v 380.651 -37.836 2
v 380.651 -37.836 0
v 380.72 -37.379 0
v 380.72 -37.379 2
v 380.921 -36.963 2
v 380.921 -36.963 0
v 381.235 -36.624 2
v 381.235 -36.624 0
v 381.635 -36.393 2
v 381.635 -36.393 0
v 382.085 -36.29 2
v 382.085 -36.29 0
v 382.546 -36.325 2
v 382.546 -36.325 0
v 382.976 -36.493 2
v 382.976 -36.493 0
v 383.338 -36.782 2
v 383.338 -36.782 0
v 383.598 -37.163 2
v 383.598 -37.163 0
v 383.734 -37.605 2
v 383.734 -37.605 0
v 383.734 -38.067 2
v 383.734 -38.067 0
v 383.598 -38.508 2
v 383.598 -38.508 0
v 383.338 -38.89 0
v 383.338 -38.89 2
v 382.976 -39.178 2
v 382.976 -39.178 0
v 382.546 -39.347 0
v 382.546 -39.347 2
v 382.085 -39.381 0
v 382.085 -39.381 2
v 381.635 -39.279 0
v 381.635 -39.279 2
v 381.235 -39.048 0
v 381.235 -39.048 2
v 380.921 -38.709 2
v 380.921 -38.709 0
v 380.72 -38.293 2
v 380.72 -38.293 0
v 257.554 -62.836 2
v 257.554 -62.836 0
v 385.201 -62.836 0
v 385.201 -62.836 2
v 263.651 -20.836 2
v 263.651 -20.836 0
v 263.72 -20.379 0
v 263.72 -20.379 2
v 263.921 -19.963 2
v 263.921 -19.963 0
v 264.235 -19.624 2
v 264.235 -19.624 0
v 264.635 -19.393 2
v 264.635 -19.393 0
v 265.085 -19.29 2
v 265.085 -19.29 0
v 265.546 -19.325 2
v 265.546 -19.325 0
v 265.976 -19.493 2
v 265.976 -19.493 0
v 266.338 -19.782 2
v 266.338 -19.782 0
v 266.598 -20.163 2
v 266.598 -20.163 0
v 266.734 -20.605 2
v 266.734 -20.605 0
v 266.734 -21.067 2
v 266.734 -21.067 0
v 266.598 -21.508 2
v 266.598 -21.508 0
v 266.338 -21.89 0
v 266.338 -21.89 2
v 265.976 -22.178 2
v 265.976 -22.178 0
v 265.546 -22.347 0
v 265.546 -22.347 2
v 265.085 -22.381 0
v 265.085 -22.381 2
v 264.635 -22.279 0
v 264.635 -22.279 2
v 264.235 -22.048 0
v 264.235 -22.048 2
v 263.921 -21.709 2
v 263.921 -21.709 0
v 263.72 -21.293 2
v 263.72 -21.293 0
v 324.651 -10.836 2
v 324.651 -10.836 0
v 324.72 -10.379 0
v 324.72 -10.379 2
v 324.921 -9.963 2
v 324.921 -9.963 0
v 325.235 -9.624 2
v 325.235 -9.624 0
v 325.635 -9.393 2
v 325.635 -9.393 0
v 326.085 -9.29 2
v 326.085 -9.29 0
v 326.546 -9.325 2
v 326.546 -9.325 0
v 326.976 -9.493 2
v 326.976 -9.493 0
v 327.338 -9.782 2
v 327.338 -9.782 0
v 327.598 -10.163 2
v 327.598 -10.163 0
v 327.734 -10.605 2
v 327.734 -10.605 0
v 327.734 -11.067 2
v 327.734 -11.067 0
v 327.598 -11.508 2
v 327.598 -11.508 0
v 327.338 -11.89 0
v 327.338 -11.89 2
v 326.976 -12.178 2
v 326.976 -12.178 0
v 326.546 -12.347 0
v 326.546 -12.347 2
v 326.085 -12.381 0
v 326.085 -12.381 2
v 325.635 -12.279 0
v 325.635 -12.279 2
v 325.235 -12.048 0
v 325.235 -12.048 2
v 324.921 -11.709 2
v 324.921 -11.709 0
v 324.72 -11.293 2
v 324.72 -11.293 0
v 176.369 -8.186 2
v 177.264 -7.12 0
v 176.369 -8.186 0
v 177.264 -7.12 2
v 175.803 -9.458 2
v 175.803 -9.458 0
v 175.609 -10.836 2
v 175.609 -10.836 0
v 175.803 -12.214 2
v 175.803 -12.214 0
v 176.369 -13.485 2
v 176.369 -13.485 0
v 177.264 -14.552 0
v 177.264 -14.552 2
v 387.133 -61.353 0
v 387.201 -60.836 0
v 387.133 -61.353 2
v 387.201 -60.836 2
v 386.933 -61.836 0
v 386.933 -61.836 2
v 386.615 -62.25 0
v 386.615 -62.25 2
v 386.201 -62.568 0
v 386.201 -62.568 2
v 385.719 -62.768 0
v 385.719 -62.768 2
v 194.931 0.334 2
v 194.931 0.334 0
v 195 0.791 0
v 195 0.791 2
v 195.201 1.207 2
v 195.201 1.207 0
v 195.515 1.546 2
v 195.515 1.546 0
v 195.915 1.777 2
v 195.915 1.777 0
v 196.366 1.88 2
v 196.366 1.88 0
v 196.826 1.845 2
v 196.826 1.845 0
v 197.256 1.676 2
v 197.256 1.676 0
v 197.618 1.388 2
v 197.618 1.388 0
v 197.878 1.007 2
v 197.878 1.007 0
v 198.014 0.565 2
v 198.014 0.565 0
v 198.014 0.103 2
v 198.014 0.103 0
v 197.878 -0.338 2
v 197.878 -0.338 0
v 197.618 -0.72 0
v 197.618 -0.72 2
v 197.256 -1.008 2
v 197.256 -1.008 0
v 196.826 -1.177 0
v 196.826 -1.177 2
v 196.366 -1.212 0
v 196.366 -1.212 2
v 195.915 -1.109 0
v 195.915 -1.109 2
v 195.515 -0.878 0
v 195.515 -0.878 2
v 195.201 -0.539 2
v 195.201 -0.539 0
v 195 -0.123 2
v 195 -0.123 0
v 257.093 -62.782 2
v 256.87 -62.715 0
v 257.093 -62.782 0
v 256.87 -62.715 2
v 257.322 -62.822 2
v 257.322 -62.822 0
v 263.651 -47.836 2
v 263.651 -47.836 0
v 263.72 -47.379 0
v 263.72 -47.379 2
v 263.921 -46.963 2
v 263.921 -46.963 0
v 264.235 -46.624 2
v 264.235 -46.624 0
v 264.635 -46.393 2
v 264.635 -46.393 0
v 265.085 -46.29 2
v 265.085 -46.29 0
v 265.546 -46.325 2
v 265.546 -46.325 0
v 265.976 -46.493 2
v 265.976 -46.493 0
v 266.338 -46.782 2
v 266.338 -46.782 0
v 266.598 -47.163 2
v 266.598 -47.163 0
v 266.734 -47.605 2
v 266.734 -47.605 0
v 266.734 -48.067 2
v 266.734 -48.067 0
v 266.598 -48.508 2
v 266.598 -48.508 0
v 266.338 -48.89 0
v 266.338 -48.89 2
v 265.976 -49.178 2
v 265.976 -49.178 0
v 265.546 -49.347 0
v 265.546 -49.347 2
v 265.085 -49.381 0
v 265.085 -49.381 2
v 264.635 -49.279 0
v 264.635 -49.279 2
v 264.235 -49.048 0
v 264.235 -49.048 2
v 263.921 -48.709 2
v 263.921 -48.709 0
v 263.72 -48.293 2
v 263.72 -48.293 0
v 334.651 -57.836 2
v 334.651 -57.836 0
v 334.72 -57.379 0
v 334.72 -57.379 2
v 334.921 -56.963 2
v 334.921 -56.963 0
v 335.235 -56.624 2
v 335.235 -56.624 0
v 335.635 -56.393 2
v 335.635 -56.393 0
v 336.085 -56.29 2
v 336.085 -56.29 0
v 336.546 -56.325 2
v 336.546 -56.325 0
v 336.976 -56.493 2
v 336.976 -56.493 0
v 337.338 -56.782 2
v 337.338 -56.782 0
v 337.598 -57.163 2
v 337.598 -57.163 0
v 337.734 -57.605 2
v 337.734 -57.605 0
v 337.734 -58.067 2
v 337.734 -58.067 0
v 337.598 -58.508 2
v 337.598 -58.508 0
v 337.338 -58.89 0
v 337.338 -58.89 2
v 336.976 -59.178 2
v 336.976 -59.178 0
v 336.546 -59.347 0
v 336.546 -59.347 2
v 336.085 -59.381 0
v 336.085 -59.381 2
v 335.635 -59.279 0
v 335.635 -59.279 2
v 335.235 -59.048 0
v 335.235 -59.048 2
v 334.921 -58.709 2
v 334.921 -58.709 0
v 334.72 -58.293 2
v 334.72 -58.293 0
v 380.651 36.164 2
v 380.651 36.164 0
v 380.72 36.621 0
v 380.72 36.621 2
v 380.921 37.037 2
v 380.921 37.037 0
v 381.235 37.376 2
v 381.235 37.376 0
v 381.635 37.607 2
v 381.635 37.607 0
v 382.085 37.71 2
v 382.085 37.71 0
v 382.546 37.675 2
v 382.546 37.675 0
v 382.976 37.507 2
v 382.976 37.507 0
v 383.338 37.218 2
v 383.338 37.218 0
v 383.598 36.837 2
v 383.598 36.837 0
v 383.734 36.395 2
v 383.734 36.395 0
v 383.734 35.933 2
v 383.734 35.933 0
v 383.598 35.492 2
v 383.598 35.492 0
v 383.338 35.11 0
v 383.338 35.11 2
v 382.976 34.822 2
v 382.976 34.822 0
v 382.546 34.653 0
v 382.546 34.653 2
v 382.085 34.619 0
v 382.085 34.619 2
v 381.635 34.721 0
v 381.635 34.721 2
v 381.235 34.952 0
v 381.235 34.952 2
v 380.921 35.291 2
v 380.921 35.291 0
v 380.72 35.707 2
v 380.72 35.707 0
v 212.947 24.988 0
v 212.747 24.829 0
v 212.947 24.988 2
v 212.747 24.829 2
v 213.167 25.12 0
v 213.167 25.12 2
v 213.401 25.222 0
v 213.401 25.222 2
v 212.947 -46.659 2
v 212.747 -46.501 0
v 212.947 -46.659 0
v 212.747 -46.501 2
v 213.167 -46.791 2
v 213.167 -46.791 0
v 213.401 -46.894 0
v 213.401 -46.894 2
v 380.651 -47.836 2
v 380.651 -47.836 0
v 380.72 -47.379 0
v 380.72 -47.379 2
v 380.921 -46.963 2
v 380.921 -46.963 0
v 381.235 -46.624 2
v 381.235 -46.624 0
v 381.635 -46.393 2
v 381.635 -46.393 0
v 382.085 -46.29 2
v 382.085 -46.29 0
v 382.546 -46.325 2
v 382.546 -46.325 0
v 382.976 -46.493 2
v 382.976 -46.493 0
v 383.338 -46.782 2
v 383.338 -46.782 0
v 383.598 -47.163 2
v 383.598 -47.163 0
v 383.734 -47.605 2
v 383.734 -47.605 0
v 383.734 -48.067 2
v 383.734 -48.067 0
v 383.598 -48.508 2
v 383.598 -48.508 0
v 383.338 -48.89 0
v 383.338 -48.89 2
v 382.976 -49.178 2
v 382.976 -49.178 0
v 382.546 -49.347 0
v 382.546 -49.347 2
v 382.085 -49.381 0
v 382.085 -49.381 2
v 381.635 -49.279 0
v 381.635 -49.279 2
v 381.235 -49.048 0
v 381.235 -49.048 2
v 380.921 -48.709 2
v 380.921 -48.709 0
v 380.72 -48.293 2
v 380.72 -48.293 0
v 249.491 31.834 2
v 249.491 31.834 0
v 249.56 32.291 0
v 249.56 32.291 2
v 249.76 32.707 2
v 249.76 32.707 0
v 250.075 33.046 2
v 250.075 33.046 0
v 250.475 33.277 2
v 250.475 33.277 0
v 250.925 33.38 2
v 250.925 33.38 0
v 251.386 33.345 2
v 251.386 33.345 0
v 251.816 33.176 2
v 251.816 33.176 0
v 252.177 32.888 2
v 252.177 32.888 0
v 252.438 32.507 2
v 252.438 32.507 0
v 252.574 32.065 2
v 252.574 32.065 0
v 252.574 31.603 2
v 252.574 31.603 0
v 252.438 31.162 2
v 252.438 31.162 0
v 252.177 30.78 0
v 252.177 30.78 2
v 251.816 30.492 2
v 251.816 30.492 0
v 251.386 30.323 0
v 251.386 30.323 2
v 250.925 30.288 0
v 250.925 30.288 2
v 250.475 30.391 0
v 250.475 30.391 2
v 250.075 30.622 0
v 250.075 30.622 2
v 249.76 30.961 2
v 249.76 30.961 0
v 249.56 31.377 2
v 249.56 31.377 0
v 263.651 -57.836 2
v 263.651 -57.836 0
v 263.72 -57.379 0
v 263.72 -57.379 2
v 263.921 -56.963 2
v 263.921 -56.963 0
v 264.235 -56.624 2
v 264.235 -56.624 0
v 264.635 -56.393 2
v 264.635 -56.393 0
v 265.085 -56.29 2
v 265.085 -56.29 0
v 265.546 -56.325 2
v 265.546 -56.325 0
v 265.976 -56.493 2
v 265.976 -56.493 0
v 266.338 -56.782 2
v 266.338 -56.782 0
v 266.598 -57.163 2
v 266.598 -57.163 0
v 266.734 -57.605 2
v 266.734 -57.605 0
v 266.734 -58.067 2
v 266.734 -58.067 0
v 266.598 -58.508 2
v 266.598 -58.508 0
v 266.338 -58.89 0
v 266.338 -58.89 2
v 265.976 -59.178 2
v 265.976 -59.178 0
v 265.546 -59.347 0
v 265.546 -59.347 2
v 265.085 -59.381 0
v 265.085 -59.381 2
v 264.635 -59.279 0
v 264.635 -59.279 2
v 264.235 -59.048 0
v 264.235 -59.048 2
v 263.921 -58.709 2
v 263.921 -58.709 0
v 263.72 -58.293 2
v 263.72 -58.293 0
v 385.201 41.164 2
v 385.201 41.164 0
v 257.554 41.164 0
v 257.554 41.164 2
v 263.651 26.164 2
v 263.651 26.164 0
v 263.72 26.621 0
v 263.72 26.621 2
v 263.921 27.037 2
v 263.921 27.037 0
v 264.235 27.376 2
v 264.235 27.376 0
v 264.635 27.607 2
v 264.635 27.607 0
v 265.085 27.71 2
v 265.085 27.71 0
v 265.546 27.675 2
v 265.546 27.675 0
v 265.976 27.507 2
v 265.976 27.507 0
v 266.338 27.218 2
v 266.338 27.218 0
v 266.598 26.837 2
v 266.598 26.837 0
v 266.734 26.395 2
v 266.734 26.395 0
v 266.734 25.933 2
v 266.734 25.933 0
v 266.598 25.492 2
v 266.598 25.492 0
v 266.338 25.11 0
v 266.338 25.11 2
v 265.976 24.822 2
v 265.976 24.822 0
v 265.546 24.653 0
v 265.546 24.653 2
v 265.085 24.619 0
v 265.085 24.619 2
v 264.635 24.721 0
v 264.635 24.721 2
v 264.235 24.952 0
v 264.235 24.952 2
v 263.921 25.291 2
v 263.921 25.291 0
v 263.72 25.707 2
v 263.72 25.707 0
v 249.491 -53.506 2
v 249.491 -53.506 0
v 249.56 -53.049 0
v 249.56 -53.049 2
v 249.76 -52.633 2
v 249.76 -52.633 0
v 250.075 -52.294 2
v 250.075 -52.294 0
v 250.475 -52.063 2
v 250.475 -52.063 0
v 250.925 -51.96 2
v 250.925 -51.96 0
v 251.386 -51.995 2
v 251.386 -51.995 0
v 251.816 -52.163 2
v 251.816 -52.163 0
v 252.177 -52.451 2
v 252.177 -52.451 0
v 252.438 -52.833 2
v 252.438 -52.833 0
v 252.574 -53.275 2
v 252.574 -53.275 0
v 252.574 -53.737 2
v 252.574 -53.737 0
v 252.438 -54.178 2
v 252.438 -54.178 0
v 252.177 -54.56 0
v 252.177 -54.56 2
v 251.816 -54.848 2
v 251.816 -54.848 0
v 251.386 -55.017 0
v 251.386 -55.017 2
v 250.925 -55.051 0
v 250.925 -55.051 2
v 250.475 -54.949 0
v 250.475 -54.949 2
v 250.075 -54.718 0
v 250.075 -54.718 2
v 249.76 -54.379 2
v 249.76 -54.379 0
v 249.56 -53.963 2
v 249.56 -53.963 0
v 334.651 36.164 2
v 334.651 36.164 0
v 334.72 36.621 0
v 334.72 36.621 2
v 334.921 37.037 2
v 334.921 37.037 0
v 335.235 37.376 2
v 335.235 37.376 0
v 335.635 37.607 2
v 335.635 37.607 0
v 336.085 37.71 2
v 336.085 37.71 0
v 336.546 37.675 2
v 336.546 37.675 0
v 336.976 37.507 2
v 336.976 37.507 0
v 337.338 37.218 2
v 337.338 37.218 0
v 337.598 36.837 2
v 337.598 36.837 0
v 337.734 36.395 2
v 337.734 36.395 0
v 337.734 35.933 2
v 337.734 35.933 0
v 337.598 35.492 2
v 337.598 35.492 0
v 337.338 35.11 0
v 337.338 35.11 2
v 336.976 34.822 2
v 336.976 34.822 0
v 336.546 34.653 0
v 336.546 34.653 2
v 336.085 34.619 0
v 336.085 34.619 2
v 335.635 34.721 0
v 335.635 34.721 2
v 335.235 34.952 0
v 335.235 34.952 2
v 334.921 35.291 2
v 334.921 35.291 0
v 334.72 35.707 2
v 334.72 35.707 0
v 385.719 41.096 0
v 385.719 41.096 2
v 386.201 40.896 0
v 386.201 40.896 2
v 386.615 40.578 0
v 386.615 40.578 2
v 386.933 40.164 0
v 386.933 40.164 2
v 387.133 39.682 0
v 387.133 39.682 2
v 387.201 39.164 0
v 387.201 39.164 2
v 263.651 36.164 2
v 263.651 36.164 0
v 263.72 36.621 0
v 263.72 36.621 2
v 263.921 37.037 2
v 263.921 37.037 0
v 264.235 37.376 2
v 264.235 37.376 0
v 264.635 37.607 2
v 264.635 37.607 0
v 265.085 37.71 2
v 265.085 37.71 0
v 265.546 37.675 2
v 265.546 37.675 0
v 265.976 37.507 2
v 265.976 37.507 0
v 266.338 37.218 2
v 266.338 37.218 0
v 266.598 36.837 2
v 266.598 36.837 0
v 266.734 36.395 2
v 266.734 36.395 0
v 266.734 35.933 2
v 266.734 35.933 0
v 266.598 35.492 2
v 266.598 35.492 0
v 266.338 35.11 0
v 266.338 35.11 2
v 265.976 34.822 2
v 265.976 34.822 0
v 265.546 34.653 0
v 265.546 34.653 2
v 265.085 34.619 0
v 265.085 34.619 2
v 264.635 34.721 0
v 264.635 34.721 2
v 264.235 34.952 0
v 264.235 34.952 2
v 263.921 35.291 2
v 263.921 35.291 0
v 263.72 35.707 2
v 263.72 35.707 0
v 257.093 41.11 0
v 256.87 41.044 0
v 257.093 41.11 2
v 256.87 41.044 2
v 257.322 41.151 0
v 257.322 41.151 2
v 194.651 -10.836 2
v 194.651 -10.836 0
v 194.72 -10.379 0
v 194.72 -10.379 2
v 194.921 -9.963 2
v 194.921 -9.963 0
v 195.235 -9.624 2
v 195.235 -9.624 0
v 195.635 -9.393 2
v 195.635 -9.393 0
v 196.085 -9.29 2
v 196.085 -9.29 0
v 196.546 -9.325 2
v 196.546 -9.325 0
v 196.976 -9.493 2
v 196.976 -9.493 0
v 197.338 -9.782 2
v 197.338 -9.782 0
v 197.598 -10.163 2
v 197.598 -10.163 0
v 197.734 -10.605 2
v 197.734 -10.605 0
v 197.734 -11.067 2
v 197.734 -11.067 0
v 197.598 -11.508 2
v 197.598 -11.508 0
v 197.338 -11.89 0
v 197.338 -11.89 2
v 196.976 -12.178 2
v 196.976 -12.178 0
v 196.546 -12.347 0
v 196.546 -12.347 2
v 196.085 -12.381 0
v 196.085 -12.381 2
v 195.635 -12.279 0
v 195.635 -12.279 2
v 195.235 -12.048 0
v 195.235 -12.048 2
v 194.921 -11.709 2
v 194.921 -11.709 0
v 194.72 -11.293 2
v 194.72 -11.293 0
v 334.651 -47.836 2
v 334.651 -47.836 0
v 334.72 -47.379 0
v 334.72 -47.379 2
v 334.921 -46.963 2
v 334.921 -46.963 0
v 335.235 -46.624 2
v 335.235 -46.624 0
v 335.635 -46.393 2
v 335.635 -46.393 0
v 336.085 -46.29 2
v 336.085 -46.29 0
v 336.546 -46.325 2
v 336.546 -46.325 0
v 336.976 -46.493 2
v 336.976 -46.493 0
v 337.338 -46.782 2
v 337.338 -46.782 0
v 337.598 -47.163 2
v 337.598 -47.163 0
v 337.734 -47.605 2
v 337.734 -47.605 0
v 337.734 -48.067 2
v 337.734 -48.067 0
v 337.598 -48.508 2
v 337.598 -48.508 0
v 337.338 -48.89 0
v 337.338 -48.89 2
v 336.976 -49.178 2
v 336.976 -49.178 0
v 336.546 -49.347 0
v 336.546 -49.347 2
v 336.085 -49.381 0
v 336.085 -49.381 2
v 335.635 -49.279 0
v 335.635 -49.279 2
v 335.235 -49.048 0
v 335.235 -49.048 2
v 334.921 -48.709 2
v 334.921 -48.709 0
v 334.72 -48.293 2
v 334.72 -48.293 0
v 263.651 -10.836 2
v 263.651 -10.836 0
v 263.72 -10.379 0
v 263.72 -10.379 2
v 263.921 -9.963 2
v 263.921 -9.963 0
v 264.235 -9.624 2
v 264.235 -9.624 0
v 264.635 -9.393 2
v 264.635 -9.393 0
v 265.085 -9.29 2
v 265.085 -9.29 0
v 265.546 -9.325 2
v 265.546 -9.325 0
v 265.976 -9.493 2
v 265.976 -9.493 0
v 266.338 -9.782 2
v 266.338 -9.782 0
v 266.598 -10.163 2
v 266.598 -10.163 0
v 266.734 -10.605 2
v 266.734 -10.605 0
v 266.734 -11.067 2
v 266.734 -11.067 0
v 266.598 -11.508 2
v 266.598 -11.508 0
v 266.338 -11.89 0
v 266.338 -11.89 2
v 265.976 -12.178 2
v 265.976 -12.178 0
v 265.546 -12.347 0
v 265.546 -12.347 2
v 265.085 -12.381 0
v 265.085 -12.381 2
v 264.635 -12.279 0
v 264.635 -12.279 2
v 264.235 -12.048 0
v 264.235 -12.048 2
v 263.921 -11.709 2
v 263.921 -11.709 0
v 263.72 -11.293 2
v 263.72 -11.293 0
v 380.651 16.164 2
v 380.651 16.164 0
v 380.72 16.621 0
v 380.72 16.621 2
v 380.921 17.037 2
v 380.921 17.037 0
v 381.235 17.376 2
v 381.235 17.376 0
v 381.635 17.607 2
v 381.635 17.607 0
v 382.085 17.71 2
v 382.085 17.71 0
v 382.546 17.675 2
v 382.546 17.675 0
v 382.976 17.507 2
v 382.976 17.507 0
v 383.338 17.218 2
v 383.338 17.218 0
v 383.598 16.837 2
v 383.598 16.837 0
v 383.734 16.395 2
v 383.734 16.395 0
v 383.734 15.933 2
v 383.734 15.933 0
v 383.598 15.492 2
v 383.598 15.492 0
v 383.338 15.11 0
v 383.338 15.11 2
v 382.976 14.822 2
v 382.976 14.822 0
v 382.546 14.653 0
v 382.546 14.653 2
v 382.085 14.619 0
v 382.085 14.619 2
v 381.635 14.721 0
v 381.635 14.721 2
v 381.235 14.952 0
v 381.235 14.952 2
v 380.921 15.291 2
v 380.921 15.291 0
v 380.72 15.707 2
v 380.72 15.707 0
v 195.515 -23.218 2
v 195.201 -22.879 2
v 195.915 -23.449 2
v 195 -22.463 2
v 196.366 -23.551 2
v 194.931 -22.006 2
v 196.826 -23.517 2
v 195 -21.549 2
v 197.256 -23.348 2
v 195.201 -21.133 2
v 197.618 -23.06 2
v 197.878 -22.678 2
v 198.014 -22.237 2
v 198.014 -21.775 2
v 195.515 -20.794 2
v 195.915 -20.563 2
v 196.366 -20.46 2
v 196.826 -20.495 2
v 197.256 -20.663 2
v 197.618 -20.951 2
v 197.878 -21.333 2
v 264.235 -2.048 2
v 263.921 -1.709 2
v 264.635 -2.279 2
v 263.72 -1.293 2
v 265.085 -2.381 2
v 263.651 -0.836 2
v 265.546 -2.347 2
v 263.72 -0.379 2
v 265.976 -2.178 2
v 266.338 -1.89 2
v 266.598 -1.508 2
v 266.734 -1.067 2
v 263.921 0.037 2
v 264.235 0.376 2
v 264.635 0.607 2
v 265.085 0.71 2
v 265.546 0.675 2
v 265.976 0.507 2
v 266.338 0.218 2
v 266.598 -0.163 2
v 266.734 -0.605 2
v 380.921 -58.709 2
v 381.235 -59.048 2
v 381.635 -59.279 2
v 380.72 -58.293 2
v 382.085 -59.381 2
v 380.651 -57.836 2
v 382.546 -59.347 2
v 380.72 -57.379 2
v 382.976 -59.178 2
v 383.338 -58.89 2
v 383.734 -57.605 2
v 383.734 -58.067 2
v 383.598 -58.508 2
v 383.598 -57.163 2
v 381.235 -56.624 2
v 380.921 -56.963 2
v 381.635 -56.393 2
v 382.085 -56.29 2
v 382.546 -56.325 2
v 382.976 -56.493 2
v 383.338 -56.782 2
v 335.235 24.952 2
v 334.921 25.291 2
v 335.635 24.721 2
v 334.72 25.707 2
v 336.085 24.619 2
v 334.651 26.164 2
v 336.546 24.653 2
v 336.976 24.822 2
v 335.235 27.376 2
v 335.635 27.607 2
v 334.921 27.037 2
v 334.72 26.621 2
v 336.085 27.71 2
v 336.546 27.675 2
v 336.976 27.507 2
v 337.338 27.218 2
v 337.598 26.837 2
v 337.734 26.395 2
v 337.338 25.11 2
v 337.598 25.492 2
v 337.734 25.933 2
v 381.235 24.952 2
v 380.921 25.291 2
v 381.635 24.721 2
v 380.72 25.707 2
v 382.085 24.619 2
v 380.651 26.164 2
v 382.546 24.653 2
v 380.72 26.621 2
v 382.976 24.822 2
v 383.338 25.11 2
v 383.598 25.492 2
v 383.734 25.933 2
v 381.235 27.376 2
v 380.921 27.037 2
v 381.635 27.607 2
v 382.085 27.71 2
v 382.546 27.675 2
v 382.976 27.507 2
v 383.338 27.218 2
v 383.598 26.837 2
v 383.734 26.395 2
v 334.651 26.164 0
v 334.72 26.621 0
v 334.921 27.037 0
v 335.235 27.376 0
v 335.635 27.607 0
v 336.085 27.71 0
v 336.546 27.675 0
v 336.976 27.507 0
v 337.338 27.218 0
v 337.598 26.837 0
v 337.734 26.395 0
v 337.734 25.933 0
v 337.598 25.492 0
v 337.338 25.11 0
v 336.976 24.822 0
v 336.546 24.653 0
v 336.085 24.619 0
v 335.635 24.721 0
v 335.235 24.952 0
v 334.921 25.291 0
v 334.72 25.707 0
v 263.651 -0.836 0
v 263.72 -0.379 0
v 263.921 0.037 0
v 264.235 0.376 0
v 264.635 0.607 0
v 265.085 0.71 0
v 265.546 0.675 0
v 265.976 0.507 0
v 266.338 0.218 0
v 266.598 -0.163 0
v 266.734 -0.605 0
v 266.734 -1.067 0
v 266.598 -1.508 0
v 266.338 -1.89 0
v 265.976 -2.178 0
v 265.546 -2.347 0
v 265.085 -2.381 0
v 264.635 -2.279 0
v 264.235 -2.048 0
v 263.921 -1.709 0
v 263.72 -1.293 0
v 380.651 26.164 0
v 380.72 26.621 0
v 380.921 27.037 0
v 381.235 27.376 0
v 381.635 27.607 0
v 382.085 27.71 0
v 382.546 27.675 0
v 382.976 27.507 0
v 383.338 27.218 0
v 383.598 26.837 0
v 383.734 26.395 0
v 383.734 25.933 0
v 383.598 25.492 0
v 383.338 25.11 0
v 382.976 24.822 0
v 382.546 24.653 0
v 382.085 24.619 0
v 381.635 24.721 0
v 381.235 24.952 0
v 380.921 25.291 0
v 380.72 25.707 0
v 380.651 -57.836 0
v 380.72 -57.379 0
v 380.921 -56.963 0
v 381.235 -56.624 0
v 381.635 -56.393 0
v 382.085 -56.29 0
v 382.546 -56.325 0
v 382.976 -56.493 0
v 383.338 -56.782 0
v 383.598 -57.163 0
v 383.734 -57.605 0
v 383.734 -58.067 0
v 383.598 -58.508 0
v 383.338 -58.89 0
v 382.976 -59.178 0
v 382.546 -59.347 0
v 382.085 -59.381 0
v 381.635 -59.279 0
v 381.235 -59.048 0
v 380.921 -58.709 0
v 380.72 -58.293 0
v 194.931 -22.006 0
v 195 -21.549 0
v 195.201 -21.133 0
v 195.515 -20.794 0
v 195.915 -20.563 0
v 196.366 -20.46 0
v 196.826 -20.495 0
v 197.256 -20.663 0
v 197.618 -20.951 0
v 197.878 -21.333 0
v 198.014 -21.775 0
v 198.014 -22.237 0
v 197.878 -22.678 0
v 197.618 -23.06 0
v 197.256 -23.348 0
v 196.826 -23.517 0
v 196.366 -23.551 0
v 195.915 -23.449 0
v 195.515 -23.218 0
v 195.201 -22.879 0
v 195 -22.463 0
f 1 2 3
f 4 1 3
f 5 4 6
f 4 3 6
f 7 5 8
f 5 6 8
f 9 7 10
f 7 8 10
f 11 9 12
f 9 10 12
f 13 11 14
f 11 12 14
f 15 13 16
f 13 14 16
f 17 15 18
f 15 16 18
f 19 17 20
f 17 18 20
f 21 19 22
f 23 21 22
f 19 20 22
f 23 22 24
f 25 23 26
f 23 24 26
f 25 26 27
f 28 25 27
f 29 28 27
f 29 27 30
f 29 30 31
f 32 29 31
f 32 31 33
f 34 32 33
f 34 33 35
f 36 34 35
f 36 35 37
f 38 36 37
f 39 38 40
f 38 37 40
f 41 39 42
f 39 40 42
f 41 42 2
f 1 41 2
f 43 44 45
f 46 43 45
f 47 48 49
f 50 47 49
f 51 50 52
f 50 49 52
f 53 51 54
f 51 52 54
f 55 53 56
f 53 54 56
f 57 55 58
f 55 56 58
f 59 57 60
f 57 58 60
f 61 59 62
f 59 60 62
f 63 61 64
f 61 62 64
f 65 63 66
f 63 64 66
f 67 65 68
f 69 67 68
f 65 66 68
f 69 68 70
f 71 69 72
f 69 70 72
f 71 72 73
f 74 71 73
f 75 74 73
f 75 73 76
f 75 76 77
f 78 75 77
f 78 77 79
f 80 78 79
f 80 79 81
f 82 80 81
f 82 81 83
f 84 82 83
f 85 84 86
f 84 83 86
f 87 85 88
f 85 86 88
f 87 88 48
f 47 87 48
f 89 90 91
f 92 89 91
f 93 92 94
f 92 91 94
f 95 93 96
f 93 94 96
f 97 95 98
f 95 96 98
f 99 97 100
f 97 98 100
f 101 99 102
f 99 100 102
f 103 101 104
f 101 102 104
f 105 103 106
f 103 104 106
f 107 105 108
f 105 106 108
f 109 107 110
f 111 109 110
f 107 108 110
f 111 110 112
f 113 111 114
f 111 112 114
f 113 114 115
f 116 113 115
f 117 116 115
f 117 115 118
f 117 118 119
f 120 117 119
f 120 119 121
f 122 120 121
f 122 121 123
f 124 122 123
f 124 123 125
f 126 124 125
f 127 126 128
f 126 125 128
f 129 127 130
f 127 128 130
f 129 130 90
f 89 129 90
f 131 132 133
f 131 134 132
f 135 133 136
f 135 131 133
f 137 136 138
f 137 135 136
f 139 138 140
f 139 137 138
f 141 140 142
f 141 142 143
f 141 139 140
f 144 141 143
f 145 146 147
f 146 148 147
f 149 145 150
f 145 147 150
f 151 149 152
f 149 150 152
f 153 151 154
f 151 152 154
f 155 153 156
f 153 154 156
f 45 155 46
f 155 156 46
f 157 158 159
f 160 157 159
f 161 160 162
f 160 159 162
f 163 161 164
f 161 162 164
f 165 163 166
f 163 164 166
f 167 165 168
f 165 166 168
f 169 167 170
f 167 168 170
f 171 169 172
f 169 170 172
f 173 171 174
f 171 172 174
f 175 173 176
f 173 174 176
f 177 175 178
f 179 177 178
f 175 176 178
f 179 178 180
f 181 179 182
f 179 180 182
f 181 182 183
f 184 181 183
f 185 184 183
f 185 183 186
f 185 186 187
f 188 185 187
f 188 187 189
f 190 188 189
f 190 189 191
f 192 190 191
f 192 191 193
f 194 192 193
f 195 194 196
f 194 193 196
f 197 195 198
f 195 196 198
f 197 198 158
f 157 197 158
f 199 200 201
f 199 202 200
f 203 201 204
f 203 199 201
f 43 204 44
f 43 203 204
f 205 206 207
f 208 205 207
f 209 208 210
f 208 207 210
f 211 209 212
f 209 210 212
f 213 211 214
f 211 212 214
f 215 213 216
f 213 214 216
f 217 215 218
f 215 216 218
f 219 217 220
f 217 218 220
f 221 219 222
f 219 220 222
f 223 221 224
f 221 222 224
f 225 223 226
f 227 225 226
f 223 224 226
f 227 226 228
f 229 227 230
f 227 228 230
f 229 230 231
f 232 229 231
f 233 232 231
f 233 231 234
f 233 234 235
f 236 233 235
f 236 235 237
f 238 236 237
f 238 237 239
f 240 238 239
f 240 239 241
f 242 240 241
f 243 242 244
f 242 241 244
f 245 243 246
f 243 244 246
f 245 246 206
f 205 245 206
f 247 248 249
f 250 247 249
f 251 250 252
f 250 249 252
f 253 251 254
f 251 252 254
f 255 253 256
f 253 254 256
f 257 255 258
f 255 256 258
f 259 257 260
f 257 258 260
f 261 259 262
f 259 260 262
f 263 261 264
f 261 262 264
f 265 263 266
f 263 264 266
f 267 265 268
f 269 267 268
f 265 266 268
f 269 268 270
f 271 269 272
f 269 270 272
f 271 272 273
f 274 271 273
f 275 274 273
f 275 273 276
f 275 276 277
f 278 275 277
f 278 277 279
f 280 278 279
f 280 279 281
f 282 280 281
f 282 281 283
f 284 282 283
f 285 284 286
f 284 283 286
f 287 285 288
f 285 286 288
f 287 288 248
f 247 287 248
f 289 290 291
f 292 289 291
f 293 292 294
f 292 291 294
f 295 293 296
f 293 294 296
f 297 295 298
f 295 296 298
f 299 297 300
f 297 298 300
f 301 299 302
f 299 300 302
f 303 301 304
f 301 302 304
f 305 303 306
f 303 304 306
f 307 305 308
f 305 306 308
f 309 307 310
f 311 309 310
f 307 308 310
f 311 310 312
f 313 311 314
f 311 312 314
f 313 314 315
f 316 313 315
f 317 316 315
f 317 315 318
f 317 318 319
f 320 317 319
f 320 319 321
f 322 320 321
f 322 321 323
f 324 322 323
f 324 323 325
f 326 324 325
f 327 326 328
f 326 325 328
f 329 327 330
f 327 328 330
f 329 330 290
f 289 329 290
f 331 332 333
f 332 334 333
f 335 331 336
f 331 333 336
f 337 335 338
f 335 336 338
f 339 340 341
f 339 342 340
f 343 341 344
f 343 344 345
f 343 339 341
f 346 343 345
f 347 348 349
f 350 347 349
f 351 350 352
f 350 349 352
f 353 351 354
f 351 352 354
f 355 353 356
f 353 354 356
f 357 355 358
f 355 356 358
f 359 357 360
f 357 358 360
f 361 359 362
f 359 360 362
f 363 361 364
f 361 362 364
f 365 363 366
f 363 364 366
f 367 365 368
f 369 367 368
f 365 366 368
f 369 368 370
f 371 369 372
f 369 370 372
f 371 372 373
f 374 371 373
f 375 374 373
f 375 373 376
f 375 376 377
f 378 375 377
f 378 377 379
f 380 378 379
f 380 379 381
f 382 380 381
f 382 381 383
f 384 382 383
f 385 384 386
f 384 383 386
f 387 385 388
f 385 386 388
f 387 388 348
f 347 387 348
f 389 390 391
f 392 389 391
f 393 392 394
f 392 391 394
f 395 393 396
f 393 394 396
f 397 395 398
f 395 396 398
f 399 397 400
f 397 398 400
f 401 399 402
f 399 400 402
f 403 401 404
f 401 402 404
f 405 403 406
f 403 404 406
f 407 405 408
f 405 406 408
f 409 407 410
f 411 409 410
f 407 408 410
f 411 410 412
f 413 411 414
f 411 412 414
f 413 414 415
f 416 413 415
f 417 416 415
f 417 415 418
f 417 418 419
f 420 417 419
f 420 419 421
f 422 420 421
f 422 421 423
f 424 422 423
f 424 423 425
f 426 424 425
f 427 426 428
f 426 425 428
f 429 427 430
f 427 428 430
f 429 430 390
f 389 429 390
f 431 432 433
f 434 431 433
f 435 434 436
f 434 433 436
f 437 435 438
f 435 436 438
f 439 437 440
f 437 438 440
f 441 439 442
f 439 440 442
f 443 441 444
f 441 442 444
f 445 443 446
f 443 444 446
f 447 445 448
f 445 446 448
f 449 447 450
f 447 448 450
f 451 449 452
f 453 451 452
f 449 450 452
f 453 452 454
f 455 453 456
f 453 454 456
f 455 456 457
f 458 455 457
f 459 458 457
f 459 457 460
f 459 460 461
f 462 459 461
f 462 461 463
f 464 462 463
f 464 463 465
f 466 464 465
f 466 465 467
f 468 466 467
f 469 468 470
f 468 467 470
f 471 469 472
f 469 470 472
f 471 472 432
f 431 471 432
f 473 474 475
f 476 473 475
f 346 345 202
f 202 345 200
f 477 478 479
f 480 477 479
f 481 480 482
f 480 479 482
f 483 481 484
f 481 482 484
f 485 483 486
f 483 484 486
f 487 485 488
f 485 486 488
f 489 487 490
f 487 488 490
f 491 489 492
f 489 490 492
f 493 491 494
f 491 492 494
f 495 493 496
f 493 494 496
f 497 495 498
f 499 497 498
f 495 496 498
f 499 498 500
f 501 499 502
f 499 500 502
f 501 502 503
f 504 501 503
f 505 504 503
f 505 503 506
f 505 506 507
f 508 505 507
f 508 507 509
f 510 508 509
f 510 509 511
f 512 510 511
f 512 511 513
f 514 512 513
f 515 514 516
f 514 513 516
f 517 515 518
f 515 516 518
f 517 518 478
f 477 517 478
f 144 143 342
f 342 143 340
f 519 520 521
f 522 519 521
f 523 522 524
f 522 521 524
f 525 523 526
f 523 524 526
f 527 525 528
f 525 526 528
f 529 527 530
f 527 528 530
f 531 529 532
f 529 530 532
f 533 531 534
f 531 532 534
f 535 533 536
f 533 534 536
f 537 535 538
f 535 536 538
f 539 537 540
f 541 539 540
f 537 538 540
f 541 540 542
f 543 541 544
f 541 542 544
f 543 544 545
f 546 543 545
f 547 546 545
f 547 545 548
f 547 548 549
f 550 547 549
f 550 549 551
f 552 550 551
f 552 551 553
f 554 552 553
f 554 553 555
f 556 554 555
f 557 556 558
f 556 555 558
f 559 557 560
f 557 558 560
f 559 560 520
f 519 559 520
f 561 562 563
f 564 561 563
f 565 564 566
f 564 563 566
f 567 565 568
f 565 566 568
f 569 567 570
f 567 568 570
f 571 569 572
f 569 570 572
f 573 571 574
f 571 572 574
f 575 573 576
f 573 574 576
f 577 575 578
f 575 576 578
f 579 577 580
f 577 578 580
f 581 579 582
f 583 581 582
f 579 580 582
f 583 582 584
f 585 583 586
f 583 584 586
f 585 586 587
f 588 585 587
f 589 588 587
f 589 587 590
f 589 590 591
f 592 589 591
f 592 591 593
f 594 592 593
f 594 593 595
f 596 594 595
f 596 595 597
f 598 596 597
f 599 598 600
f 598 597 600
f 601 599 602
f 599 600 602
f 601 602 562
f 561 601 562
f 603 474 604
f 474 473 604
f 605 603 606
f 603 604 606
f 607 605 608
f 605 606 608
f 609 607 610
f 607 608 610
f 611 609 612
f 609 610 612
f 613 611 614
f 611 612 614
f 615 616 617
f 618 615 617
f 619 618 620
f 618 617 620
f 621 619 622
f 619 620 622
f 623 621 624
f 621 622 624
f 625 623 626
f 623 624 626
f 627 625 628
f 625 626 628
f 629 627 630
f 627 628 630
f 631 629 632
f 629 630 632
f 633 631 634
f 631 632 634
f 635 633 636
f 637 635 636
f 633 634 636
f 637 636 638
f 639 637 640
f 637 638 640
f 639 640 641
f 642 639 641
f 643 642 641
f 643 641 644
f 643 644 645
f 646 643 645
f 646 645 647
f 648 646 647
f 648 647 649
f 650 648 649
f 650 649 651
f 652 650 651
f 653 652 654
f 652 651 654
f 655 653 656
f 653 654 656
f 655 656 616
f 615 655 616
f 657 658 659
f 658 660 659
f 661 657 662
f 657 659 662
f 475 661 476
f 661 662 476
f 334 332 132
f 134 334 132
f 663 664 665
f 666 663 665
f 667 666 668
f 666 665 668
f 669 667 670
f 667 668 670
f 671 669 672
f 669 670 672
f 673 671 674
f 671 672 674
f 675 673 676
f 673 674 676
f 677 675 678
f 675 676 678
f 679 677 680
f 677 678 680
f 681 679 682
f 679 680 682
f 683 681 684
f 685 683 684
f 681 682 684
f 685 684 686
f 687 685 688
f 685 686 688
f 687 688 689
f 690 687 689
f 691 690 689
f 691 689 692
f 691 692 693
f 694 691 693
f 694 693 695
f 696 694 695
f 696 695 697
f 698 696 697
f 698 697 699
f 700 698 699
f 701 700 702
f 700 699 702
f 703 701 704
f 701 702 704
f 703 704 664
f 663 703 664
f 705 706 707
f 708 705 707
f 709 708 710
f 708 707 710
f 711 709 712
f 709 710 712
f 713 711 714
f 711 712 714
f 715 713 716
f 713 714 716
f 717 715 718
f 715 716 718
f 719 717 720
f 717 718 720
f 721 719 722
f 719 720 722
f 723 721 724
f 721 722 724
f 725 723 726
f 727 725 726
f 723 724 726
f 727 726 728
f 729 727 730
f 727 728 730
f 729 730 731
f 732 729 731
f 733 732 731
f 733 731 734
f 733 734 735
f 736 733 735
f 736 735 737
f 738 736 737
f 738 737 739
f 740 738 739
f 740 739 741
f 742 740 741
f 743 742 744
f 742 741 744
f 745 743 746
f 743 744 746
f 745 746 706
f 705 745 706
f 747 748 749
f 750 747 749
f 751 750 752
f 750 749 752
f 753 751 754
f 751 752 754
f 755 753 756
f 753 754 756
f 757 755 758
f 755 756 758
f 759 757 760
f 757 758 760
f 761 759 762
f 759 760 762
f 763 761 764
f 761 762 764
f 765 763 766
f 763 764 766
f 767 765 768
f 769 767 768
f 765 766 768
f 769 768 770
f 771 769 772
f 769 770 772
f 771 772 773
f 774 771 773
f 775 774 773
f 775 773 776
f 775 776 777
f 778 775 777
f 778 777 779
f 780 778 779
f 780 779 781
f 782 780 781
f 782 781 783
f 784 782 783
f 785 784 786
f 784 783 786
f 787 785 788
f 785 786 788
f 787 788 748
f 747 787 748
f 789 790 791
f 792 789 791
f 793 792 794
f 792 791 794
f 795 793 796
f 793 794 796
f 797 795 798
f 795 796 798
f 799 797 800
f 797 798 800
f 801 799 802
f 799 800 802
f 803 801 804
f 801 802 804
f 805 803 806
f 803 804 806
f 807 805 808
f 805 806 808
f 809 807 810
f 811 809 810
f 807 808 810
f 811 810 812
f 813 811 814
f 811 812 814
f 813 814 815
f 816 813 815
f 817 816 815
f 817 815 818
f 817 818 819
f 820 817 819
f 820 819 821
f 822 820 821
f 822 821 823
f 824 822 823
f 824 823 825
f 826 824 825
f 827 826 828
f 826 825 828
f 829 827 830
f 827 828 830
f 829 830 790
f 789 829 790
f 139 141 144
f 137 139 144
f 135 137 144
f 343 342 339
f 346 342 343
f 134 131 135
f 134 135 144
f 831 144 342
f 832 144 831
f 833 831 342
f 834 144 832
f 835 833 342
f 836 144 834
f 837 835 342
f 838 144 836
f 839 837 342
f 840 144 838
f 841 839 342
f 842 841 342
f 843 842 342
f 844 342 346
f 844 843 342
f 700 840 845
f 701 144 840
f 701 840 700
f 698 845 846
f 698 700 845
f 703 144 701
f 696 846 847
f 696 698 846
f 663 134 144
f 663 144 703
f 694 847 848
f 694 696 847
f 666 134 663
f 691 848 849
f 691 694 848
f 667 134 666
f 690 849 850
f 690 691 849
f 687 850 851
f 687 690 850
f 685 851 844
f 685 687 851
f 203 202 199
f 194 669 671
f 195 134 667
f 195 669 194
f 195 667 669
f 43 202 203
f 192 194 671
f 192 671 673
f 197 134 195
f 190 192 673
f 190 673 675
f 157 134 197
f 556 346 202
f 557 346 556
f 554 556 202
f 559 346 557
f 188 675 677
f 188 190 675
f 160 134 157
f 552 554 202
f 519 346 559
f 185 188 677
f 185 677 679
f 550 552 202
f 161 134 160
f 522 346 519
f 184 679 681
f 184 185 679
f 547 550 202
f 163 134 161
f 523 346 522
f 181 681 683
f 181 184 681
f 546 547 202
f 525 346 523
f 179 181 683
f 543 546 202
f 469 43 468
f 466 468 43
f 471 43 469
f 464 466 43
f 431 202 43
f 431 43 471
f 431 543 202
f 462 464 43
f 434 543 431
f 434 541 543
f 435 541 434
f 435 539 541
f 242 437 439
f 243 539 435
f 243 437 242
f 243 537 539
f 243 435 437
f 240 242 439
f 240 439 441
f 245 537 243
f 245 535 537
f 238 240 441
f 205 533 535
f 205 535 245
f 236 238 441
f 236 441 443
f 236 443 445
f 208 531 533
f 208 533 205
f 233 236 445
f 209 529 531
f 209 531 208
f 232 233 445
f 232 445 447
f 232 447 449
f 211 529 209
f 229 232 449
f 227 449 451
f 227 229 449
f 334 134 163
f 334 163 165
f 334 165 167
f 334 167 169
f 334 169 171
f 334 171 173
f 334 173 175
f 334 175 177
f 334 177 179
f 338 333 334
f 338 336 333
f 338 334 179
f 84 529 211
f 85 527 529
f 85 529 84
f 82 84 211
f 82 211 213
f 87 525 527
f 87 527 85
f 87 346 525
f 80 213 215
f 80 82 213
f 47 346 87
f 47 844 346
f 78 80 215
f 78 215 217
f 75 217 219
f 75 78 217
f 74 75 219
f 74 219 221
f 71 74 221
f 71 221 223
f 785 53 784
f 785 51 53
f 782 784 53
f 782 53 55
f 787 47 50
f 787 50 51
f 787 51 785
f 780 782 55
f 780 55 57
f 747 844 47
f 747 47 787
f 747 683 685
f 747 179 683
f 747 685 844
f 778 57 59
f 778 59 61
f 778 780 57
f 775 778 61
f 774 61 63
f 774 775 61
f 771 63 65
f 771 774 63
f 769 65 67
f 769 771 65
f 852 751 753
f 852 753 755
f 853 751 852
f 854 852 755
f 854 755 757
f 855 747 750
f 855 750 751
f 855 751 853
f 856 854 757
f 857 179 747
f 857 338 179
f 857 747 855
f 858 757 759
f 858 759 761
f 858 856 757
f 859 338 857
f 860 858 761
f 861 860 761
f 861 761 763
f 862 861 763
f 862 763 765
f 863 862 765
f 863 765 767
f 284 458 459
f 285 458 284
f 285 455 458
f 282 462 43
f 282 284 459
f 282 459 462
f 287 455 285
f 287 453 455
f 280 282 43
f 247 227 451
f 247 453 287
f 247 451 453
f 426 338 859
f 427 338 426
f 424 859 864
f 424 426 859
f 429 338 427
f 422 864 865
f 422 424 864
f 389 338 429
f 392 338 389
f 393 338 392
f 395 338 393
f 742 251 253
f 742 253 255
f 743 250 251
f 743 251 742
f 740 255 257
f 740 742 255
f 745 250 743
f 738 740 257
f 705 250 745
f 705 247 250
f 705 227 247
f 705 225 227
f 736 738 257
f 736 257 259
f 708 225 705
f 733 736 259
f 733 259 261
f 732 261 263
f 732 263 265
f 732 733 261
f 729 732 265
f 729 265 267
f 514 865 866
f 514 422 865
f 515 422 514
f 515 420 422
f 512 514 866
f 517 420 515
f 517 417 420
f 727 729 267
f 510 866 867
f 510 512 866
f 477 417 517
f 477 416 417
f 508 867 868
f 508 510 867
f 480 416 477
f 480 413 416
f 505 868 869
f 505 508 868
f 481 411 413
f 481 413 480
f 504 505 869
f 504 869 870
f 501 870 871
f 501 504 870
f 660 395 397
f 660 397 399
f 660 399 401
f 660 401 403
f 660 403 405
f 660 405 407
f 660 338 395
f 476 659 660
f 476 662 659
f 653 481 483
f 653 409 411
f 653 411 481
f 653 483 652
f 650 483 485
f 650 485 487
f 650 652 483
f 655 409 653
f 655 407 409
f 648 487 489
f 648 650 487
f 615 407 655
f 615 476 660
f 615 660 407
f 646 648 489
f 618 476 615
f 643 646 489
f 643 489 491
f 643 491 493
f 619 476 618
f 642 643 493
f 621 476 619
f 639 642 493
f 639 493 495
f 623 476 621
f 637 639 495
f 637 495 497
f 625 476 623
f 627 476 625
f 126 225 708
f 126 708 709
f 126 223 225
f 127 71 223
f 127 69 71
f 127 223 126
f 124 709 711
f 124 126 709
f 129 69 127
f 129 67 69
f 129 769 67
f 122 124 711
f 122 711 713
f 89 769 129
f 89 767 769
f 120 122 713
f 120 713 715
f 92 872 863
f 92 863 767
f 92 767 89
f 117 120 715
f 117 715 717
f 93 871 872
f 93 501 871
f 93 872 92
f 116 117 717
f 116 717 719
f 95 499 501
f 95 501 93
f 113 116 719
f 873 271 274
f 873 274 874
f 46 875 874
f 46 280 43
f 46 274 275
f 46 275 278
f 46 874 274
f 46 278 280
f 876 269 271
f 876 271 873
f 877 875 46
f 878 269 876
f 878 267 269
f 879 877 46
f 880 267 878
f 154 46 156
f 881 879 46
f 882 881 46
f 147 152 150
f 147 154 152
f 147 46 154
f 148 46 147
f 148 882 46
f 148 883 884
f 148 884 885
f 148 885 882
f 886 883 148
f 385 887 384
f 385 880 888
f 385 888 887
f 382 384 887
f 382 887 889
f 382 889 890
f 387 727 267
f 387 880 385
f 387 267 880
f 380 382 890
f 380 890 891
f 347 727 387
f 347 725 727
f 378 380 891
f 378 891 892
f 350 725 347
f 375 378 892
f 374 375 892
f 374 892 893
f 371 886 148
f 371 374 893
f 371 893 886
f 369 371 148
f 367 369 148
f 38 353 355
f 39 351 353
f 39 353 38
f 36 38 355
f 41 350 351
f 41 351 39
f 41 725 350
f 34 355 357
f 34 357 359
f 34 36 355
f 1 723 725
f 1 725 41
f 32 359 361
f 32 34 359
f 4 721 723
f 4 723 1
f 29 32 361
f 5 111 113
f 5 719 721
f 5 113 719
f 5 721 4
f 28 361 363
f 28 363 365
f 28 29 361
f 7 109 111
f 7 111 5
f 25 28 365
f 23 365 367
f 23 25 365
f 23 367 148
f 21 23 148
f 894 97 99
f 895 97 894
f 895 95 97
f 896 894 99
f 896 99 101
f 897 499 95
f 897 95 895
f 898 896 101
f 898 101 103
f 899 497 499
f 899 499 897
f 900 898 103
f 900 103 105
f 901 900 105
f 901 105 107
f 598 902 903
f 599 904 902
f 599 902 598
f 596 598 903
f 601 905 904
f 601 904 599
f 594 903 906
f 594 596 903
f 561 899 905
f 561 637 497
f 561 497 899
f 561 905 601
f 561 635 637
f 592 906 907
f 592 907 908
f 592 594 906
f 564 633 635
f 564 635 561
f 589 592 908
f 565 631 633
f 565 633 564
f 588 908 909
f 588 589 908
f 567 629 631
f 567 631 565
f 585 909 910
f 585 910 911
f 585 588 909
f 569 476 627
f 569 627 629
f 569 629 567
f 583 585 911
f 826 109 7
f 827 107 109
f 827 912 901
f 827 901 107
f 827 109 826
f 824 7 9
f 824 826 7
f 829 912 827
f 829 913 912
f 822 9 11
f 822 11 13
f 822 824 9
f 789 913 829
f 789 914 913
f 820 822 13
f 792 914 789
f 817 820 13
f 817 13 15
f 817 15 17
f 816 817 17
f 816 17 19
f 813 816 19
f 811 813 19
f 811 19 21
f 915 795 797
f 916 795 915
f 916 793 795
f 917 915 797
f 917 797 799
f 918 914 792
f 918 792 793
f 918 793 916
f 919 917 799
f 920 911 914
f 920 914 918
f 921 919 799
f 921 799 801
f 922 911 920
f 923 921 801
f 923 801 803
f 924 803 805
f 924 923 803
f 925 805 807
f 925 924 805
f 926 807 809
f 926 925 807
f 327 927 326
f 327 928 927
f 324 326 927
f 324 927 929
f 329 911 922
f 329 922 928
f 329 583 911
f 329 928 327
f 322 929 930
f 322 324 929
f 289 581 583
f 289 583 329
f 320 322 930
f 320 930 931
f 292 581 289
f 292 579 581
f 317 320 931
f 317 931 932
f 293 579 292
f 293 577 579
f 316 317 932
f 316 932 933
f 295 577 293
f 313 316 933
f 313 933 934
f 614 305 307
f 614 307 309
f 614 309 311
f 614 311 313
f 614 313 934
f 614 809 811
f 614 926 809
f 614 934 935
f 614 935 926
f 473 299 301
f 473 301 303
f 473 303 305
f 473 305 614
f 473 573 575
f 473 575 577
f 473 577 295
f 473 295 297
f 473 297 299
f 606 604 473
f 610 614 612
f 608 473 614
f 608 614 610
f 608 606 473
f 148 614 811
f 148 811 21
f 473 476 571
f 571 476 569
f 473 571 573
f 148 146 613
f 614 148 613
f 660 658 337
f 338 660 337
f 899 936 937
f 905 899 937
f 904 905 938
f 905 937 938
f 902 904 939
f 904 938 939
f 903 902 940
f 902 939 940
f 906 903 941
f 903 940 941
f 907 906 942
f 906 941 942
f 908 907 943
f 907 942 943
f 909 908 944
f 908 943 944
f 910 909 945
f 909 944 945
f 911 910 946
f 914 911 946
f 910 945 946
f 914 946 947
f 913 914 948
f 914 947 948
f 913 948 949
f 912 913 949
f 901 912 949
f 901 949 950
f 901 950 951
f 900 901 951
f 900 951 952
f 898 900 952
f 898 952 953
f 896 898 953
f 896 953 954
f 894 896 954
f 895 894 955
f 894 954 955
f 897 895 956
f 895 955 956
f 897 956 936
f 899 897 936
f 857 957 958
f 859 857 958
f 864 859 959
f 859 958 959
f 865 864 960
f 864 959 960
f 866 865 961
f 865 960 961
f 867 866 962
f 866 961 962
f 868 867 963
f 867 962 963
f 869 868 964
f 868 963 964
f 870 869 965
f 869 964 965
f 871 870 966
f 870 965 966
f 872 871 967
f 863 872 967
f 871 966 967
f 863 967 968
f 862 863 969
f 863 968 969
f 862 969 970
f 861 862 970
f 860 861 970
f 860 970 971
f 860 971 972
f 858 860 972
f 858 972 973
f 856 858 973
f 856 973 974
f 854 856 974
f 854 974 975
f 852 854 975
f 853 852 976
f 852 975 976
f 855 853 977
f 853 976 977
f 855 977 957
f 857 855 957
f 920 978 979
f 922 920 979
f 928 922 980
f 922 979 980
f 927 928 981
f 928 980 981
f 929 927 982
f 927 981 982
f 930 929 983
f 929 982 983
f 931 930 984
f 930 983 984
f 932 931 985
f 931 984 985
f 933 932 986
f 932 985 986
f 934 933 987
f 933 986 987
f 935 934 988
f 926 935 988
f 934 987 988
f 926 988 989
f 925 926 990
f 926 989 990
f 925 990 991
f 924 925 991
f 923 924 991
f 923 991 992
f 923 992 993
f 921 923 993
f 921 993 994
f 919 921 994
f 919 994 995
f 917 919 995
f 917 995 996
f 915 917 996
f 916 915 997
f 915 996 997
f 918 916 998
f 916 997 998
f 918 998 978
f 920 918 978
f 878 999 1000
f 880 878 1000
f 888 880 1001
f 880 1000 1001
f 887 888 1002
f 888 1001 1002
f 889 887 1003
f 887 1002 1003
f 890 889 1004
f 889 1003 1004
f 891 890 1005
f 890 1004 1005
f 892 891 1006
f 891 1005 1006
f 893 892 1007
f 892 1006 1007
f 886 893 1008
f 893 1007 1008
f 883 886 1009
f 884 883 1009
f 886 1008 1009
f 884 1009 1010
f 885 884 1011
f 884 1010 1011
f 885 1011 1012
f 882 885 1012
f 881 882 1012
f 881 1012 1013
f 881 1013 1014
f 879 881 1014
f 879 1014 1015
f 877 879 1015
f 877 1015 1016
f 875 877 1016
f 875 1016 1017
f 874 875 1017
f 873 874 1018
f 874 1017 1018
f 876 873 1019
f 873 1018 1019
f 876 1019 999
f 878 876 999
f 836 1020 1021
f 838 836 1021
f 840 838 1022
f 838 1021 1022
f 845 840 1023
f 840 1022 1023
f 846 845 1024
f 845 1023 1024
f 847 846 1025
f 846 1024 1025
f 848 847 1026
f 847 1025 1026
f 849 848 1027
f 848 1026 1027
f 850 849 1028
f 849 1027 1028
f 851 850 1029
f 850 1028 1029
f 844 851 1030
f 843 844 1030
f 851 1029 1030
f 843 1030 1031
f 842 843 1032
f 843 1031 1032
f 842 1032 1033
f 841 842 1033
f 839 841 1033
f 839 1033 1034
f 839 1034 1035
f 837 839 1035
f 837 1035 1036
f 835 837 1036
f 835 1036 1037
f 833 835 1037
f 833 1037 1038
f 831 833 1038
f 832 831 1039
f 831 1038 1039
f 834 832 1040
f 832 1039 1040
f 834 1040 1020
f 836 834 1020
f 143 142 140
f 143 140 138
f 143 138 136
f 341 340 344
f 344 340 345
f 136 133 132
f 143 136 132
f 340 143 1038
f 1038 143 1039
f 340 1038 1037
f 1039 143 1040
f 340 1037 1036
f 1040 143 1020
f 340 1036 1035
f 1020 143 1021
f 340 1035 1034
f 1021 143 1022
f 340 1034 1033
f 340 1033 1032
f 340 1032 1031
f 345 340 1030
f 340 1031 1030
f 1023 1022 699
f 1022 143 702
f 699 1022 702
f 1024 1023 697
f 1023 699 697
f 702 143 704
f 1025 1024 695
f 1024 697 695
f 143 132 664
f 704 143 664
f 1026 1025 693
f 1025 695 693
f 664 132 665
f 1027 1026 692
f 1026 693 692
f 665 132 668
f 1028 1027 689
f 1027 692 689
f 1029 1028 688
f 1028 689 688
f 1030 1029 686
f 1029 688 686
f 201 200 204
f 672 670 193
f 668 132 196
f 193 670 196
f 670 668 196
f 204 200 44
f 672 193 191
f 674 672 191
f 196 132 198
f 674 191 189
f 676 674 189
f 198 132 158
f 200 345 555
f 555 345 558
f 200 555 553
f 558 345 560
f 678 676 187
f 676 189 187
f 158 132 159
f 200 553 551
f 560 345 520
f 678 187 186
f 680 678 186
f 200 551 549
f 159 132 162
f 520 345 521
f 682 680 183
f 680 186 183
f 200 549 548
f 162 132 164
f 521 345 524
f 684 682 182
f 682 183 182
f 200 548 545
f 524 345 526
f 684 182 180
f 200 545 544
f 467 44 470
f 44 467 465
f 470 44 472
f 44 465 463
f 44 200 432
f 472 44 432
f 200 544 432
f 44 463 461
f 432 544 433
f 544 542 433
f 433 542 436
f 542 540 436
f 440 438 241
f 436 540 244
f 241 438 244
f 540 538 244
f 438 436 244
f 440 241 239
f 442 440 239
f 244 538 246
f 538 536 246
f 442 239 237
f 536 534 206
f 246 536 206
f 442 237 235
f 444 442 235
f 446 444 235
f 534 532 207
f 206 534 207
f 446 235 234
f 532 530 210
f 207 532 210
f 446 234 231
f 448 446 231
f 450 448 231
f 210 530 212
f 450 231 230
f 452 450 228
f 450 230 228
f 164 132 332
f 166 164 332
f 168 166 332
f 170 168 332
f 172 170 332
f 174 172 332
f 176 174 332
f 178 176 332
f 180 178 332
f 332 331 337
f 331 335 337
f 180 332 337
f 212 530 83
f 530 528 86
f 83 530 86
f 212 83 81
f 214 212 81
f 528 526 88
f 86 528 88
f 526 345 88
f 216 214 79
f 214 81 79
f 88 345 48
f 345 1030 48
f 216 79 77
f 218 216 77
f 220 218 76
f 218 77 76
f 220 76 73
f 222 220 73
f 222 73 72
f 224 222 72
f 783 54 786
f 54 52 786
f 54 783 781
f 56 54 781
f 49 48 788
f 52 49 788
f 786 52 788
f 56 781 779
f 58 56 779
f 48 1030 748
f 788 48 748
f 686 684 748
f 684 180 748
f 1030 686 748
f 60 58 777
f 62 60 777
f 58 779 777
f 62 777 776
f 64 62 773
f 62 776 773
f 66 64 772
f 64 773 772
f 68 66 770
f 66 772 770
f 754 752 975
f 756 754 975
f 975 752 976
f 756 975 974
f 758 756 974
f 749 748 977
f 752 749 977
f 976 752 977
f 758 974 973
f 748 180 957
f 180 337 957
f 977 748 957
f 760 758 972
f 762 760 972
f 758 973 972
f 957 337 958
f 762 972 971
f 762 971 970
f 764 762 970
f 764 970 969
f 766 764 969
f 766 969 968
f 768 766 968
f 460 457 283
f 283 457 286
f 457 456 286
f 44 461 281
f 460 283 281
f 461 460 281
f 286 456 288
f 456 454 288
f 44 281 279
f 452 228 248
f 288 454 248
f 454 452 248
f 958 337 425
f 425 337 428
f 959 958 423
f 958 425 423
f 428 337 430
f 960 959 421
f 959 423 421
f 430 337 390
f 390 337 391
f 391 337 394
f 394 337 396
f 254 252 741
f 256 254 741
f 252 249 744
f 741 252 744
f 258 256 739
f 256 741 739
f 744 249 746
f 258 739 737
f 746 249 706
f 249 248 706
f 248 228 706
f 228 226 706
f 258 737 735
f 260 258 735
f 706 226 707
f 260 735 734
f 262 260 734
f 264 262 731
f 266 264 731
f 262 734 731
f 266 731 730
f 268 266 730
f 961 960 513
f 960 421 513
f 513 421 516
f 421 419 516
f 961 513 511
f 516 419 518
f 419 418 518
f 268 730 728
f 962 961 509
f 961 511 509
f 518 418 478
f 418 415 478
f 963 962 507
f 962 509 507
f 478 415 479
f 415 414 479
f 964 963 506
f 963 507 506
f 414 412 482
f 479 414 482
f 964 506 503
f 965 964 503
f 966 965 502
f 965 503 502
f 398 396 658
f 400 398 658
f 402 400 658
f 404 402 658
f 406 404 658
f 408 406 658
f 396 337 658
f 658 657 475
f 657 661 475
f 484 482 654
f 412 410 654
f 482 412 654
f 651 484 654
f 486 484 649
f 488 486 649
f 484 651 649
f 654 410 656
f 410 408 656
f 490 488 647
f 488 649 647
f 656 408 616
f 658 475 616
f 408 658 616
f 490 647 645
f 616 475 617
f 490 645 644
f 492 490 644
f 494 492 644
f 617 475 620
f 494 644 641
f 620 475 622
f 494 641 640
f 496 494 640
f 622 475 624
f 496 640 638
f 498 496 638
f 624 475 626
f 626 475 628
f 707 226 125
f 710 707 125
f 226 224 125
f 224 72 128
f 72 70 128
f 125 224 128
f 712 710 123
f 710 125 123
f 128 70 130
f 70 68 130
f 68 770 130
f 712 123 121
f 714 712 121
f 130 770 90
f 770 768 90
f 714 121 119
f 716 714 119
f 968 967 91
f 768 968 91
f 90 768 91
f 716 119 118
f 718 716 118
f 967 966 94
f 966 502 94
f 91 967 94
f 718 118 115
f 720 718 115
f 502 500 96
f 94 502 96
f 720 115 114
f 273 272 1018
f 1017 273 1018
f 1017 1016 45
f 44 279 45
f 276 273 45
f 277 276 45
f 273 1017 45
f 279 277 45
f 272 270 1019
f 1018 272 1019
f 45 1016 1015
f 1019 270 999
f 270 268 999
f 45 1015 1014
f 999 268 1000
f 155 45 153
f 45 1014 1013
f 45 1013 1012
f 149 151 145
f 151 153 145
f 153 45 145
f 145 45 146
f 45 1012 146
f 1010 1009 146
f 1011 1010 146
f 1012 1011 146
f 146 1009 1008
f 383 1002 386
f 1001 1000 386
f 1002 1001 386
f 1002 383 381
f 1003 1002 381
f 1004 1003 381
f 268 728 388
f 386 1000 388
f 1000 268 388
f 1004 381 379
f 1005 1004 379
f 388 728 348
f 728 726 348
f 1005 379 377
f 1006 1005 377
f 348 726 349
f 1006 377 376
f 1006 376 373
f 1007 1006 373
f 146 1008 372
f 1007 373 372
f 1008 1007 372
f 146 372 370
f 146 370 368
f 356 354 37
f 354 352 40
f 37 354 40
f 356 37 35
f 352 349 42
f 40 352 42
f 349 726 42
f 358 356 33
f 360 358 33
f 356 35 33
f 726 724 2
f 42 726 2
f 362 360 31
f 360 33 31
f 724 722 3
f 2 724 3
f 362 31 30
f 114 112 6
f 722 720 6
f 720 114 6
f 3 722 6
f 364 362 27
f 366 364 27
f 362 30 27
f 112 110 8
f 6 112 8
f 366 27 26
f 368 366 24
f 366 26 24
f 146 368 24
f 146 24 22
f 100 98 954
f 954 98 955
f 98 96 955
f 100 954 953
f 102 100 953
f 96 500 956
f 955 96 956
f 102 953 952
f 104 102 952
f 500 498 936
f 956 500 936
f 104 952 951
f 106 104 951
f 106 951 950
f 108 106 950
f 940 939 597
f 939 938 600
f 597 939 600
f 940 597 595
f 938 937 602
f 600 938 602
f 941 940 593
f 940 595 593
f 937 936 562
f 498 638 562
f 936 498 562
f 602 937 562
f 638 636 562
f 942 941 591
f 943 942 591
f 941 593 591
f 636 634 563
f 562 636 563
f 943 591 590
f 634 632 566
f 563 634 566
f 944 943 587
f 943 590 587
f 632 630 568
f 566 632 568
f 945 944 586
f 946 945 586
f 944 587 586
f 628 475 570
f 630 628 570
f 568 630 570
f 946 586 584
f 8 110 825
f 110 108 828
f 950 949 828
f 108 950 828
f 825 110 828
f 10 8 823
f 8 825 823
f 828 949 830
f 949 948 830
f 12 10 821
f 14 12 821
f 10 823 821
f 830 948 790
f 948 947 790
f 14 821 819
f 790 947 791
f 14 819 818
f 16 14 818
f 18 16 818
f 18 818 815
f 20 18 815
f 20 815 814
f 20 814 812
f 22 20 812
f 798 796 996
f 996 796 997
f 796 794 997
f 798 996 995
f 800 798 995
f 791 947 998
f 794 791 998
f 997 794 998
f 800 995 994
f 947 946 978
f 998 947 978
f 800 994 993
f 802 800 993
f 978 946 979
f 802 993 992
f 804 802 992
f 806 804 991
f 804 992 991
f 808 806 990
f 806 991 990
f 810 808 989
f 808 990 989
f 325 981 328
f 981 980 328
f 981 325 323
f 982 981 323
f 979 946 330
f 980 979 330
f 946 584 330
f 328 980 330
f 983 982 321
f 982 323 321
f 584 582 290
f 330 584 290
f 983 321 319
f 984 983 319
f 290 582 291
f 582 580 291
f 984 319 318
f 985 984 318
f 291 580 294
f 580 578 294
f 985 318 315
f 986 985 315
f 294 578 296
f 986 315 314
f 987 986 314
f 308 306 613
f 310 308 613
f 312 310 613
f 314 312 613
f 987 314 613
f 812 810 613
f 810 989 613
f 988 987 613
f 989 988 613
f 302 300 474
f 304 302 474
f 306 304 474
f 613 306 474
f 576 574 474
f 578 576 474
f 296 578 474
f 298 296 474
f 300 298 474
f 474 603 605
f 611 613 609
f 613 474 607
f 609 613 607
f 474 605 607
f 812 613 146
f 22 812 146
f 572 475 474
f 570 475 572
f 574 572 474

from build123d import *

# Parameters (mm, degrees)
EXTRUDE_1_DEPTH     = 2
FILLET_1_R          = 5
FILLET_2_R          = 2
SKETCH_2_R          = 1.55
CUT_EXTRUDE_1_DEPTH = 2


with BuildPart() as part:
    # 草图1 → 凸台-拉伸1 (new body)
    with BuildSketch(Plane.XY):
        Polygon((387.201278127, -62.835808376), (387.201278127, 41.164191624), (257.201278127, 41.164191624), (213.03572495, 25.089244888), (173.136911199, -10.835808376), (213.03572495, -46.760861639), (257.201278127, -62.835808376), align=None)
    extrude(amount=EXTRUDE_1_DEPTH)

    # 圆角1
    fillet_1_edges = [part.edges().sort_by_distance(p)[0] for p in [
        (173.136911199, -10.835808376, 1),
    ]]
    fillet(fillet_1_edges, radius=FILLET_1_R)

    # 圆角2
    fillet_2_edges = [part.edges().sort_by_distance(p)[0] for p in [
        (257.201278127, -62.835808376, 1),
        (213.03572495, -46.760861639, 1),
        (213.03572495, 25.089244888, 1),
        (257.201278127, 41.164191624, 1),
        (387.201278127, 41.164191624, 1),
        (387.201278127, -62.835808376, 1),
    ]]
    fillet(fillet_2_edges, radius=FILLET_2_R)

    # 草图2 → 切除-拉伸1 (cut)
    with BuildSketch(Plane(origin=(0, 0, 0), x_dir=(-1, 0, 0), z_dir=(0, 0, -1))):
        with Locations((-265.201278127, 36.164191624)):
            Circle(SKETCH_2_R)
        with Locations((-251.041024089, 31.834064606)):
            Circle(SKETCH_2_R)
        with Locations((-336.201278127, 26.164191624)):
            Circle(SKETCH_2_R)
        with Locations((-265.201278127, 26.164191624)):
            Circle(SKETCH_2_R)
        with Locations((-265.201278127, -0.835808376)):
            Circle(SKETCH_2_R)
        with Locations((-382.201278127, 36.164191624)):
            Circle(SKETCH_2_R)
        with Locations((-382.201278127, 26.164191624)):
            Circle(SKETCH_2_R)
        with Locations((-196.481423651, 0.334064606)):
            Circle(SKETCH_2_R)
        with Locations((-326.201278127, -10.835808376)):
            Circle(SKETCH_2_R)
        with Locations((-196.201278127, -10.835808376)):
            Circle(SKETCH_2_R)
        with Locations((-196.481423651, -22.005681357)):
            Circle(SKETCH_2_R)
        with Locations((-265.201278127, -20.835808376)):
            Circle(SKETCH_2_R)
        with Locations((-265.201278127, -57.835808376)):
            Circle(SKETCH_2_R)
        with Locations((-265.201278127, -47.835808376)):
            Circle(SKETCH_2_R)
        with Locations((-336.201278127, -47.835808376)):
            Circle(SKETCH_2_R)
        with Locations((-382.201278127, -47.835808376)):
            Circle(SKETCH_2_R)
        with Locations((-382.201278127, -57.835808376)):
            Circle(SKETCH_2_R)
        with Locations((-265.201278127, -10.835808376)):
            Circle(SKETCH_2_R)
        with Locations((-336.201278127, 36.164191624)):
            Circle(SKETCH_2_R)
        with Locations((-336.201278127, -57.835808376)):
            Circle(SKETCH_2_R)
        with Locations((-251.041024089, -53.505681357)):
            Circle(SKETCH_2_R)
        with Locations((-382.201278127, 16.164191624)):
            Circle(SKETCH_2_R)
        with Locations((-382.201278127, -37.835808376)):
            Circle(SKETCH_2_R)
    extrude(amount=-CUT_EXTRUDE_1_DEPTH, mode=Mode.SUBTRACT)


solid = part.part
